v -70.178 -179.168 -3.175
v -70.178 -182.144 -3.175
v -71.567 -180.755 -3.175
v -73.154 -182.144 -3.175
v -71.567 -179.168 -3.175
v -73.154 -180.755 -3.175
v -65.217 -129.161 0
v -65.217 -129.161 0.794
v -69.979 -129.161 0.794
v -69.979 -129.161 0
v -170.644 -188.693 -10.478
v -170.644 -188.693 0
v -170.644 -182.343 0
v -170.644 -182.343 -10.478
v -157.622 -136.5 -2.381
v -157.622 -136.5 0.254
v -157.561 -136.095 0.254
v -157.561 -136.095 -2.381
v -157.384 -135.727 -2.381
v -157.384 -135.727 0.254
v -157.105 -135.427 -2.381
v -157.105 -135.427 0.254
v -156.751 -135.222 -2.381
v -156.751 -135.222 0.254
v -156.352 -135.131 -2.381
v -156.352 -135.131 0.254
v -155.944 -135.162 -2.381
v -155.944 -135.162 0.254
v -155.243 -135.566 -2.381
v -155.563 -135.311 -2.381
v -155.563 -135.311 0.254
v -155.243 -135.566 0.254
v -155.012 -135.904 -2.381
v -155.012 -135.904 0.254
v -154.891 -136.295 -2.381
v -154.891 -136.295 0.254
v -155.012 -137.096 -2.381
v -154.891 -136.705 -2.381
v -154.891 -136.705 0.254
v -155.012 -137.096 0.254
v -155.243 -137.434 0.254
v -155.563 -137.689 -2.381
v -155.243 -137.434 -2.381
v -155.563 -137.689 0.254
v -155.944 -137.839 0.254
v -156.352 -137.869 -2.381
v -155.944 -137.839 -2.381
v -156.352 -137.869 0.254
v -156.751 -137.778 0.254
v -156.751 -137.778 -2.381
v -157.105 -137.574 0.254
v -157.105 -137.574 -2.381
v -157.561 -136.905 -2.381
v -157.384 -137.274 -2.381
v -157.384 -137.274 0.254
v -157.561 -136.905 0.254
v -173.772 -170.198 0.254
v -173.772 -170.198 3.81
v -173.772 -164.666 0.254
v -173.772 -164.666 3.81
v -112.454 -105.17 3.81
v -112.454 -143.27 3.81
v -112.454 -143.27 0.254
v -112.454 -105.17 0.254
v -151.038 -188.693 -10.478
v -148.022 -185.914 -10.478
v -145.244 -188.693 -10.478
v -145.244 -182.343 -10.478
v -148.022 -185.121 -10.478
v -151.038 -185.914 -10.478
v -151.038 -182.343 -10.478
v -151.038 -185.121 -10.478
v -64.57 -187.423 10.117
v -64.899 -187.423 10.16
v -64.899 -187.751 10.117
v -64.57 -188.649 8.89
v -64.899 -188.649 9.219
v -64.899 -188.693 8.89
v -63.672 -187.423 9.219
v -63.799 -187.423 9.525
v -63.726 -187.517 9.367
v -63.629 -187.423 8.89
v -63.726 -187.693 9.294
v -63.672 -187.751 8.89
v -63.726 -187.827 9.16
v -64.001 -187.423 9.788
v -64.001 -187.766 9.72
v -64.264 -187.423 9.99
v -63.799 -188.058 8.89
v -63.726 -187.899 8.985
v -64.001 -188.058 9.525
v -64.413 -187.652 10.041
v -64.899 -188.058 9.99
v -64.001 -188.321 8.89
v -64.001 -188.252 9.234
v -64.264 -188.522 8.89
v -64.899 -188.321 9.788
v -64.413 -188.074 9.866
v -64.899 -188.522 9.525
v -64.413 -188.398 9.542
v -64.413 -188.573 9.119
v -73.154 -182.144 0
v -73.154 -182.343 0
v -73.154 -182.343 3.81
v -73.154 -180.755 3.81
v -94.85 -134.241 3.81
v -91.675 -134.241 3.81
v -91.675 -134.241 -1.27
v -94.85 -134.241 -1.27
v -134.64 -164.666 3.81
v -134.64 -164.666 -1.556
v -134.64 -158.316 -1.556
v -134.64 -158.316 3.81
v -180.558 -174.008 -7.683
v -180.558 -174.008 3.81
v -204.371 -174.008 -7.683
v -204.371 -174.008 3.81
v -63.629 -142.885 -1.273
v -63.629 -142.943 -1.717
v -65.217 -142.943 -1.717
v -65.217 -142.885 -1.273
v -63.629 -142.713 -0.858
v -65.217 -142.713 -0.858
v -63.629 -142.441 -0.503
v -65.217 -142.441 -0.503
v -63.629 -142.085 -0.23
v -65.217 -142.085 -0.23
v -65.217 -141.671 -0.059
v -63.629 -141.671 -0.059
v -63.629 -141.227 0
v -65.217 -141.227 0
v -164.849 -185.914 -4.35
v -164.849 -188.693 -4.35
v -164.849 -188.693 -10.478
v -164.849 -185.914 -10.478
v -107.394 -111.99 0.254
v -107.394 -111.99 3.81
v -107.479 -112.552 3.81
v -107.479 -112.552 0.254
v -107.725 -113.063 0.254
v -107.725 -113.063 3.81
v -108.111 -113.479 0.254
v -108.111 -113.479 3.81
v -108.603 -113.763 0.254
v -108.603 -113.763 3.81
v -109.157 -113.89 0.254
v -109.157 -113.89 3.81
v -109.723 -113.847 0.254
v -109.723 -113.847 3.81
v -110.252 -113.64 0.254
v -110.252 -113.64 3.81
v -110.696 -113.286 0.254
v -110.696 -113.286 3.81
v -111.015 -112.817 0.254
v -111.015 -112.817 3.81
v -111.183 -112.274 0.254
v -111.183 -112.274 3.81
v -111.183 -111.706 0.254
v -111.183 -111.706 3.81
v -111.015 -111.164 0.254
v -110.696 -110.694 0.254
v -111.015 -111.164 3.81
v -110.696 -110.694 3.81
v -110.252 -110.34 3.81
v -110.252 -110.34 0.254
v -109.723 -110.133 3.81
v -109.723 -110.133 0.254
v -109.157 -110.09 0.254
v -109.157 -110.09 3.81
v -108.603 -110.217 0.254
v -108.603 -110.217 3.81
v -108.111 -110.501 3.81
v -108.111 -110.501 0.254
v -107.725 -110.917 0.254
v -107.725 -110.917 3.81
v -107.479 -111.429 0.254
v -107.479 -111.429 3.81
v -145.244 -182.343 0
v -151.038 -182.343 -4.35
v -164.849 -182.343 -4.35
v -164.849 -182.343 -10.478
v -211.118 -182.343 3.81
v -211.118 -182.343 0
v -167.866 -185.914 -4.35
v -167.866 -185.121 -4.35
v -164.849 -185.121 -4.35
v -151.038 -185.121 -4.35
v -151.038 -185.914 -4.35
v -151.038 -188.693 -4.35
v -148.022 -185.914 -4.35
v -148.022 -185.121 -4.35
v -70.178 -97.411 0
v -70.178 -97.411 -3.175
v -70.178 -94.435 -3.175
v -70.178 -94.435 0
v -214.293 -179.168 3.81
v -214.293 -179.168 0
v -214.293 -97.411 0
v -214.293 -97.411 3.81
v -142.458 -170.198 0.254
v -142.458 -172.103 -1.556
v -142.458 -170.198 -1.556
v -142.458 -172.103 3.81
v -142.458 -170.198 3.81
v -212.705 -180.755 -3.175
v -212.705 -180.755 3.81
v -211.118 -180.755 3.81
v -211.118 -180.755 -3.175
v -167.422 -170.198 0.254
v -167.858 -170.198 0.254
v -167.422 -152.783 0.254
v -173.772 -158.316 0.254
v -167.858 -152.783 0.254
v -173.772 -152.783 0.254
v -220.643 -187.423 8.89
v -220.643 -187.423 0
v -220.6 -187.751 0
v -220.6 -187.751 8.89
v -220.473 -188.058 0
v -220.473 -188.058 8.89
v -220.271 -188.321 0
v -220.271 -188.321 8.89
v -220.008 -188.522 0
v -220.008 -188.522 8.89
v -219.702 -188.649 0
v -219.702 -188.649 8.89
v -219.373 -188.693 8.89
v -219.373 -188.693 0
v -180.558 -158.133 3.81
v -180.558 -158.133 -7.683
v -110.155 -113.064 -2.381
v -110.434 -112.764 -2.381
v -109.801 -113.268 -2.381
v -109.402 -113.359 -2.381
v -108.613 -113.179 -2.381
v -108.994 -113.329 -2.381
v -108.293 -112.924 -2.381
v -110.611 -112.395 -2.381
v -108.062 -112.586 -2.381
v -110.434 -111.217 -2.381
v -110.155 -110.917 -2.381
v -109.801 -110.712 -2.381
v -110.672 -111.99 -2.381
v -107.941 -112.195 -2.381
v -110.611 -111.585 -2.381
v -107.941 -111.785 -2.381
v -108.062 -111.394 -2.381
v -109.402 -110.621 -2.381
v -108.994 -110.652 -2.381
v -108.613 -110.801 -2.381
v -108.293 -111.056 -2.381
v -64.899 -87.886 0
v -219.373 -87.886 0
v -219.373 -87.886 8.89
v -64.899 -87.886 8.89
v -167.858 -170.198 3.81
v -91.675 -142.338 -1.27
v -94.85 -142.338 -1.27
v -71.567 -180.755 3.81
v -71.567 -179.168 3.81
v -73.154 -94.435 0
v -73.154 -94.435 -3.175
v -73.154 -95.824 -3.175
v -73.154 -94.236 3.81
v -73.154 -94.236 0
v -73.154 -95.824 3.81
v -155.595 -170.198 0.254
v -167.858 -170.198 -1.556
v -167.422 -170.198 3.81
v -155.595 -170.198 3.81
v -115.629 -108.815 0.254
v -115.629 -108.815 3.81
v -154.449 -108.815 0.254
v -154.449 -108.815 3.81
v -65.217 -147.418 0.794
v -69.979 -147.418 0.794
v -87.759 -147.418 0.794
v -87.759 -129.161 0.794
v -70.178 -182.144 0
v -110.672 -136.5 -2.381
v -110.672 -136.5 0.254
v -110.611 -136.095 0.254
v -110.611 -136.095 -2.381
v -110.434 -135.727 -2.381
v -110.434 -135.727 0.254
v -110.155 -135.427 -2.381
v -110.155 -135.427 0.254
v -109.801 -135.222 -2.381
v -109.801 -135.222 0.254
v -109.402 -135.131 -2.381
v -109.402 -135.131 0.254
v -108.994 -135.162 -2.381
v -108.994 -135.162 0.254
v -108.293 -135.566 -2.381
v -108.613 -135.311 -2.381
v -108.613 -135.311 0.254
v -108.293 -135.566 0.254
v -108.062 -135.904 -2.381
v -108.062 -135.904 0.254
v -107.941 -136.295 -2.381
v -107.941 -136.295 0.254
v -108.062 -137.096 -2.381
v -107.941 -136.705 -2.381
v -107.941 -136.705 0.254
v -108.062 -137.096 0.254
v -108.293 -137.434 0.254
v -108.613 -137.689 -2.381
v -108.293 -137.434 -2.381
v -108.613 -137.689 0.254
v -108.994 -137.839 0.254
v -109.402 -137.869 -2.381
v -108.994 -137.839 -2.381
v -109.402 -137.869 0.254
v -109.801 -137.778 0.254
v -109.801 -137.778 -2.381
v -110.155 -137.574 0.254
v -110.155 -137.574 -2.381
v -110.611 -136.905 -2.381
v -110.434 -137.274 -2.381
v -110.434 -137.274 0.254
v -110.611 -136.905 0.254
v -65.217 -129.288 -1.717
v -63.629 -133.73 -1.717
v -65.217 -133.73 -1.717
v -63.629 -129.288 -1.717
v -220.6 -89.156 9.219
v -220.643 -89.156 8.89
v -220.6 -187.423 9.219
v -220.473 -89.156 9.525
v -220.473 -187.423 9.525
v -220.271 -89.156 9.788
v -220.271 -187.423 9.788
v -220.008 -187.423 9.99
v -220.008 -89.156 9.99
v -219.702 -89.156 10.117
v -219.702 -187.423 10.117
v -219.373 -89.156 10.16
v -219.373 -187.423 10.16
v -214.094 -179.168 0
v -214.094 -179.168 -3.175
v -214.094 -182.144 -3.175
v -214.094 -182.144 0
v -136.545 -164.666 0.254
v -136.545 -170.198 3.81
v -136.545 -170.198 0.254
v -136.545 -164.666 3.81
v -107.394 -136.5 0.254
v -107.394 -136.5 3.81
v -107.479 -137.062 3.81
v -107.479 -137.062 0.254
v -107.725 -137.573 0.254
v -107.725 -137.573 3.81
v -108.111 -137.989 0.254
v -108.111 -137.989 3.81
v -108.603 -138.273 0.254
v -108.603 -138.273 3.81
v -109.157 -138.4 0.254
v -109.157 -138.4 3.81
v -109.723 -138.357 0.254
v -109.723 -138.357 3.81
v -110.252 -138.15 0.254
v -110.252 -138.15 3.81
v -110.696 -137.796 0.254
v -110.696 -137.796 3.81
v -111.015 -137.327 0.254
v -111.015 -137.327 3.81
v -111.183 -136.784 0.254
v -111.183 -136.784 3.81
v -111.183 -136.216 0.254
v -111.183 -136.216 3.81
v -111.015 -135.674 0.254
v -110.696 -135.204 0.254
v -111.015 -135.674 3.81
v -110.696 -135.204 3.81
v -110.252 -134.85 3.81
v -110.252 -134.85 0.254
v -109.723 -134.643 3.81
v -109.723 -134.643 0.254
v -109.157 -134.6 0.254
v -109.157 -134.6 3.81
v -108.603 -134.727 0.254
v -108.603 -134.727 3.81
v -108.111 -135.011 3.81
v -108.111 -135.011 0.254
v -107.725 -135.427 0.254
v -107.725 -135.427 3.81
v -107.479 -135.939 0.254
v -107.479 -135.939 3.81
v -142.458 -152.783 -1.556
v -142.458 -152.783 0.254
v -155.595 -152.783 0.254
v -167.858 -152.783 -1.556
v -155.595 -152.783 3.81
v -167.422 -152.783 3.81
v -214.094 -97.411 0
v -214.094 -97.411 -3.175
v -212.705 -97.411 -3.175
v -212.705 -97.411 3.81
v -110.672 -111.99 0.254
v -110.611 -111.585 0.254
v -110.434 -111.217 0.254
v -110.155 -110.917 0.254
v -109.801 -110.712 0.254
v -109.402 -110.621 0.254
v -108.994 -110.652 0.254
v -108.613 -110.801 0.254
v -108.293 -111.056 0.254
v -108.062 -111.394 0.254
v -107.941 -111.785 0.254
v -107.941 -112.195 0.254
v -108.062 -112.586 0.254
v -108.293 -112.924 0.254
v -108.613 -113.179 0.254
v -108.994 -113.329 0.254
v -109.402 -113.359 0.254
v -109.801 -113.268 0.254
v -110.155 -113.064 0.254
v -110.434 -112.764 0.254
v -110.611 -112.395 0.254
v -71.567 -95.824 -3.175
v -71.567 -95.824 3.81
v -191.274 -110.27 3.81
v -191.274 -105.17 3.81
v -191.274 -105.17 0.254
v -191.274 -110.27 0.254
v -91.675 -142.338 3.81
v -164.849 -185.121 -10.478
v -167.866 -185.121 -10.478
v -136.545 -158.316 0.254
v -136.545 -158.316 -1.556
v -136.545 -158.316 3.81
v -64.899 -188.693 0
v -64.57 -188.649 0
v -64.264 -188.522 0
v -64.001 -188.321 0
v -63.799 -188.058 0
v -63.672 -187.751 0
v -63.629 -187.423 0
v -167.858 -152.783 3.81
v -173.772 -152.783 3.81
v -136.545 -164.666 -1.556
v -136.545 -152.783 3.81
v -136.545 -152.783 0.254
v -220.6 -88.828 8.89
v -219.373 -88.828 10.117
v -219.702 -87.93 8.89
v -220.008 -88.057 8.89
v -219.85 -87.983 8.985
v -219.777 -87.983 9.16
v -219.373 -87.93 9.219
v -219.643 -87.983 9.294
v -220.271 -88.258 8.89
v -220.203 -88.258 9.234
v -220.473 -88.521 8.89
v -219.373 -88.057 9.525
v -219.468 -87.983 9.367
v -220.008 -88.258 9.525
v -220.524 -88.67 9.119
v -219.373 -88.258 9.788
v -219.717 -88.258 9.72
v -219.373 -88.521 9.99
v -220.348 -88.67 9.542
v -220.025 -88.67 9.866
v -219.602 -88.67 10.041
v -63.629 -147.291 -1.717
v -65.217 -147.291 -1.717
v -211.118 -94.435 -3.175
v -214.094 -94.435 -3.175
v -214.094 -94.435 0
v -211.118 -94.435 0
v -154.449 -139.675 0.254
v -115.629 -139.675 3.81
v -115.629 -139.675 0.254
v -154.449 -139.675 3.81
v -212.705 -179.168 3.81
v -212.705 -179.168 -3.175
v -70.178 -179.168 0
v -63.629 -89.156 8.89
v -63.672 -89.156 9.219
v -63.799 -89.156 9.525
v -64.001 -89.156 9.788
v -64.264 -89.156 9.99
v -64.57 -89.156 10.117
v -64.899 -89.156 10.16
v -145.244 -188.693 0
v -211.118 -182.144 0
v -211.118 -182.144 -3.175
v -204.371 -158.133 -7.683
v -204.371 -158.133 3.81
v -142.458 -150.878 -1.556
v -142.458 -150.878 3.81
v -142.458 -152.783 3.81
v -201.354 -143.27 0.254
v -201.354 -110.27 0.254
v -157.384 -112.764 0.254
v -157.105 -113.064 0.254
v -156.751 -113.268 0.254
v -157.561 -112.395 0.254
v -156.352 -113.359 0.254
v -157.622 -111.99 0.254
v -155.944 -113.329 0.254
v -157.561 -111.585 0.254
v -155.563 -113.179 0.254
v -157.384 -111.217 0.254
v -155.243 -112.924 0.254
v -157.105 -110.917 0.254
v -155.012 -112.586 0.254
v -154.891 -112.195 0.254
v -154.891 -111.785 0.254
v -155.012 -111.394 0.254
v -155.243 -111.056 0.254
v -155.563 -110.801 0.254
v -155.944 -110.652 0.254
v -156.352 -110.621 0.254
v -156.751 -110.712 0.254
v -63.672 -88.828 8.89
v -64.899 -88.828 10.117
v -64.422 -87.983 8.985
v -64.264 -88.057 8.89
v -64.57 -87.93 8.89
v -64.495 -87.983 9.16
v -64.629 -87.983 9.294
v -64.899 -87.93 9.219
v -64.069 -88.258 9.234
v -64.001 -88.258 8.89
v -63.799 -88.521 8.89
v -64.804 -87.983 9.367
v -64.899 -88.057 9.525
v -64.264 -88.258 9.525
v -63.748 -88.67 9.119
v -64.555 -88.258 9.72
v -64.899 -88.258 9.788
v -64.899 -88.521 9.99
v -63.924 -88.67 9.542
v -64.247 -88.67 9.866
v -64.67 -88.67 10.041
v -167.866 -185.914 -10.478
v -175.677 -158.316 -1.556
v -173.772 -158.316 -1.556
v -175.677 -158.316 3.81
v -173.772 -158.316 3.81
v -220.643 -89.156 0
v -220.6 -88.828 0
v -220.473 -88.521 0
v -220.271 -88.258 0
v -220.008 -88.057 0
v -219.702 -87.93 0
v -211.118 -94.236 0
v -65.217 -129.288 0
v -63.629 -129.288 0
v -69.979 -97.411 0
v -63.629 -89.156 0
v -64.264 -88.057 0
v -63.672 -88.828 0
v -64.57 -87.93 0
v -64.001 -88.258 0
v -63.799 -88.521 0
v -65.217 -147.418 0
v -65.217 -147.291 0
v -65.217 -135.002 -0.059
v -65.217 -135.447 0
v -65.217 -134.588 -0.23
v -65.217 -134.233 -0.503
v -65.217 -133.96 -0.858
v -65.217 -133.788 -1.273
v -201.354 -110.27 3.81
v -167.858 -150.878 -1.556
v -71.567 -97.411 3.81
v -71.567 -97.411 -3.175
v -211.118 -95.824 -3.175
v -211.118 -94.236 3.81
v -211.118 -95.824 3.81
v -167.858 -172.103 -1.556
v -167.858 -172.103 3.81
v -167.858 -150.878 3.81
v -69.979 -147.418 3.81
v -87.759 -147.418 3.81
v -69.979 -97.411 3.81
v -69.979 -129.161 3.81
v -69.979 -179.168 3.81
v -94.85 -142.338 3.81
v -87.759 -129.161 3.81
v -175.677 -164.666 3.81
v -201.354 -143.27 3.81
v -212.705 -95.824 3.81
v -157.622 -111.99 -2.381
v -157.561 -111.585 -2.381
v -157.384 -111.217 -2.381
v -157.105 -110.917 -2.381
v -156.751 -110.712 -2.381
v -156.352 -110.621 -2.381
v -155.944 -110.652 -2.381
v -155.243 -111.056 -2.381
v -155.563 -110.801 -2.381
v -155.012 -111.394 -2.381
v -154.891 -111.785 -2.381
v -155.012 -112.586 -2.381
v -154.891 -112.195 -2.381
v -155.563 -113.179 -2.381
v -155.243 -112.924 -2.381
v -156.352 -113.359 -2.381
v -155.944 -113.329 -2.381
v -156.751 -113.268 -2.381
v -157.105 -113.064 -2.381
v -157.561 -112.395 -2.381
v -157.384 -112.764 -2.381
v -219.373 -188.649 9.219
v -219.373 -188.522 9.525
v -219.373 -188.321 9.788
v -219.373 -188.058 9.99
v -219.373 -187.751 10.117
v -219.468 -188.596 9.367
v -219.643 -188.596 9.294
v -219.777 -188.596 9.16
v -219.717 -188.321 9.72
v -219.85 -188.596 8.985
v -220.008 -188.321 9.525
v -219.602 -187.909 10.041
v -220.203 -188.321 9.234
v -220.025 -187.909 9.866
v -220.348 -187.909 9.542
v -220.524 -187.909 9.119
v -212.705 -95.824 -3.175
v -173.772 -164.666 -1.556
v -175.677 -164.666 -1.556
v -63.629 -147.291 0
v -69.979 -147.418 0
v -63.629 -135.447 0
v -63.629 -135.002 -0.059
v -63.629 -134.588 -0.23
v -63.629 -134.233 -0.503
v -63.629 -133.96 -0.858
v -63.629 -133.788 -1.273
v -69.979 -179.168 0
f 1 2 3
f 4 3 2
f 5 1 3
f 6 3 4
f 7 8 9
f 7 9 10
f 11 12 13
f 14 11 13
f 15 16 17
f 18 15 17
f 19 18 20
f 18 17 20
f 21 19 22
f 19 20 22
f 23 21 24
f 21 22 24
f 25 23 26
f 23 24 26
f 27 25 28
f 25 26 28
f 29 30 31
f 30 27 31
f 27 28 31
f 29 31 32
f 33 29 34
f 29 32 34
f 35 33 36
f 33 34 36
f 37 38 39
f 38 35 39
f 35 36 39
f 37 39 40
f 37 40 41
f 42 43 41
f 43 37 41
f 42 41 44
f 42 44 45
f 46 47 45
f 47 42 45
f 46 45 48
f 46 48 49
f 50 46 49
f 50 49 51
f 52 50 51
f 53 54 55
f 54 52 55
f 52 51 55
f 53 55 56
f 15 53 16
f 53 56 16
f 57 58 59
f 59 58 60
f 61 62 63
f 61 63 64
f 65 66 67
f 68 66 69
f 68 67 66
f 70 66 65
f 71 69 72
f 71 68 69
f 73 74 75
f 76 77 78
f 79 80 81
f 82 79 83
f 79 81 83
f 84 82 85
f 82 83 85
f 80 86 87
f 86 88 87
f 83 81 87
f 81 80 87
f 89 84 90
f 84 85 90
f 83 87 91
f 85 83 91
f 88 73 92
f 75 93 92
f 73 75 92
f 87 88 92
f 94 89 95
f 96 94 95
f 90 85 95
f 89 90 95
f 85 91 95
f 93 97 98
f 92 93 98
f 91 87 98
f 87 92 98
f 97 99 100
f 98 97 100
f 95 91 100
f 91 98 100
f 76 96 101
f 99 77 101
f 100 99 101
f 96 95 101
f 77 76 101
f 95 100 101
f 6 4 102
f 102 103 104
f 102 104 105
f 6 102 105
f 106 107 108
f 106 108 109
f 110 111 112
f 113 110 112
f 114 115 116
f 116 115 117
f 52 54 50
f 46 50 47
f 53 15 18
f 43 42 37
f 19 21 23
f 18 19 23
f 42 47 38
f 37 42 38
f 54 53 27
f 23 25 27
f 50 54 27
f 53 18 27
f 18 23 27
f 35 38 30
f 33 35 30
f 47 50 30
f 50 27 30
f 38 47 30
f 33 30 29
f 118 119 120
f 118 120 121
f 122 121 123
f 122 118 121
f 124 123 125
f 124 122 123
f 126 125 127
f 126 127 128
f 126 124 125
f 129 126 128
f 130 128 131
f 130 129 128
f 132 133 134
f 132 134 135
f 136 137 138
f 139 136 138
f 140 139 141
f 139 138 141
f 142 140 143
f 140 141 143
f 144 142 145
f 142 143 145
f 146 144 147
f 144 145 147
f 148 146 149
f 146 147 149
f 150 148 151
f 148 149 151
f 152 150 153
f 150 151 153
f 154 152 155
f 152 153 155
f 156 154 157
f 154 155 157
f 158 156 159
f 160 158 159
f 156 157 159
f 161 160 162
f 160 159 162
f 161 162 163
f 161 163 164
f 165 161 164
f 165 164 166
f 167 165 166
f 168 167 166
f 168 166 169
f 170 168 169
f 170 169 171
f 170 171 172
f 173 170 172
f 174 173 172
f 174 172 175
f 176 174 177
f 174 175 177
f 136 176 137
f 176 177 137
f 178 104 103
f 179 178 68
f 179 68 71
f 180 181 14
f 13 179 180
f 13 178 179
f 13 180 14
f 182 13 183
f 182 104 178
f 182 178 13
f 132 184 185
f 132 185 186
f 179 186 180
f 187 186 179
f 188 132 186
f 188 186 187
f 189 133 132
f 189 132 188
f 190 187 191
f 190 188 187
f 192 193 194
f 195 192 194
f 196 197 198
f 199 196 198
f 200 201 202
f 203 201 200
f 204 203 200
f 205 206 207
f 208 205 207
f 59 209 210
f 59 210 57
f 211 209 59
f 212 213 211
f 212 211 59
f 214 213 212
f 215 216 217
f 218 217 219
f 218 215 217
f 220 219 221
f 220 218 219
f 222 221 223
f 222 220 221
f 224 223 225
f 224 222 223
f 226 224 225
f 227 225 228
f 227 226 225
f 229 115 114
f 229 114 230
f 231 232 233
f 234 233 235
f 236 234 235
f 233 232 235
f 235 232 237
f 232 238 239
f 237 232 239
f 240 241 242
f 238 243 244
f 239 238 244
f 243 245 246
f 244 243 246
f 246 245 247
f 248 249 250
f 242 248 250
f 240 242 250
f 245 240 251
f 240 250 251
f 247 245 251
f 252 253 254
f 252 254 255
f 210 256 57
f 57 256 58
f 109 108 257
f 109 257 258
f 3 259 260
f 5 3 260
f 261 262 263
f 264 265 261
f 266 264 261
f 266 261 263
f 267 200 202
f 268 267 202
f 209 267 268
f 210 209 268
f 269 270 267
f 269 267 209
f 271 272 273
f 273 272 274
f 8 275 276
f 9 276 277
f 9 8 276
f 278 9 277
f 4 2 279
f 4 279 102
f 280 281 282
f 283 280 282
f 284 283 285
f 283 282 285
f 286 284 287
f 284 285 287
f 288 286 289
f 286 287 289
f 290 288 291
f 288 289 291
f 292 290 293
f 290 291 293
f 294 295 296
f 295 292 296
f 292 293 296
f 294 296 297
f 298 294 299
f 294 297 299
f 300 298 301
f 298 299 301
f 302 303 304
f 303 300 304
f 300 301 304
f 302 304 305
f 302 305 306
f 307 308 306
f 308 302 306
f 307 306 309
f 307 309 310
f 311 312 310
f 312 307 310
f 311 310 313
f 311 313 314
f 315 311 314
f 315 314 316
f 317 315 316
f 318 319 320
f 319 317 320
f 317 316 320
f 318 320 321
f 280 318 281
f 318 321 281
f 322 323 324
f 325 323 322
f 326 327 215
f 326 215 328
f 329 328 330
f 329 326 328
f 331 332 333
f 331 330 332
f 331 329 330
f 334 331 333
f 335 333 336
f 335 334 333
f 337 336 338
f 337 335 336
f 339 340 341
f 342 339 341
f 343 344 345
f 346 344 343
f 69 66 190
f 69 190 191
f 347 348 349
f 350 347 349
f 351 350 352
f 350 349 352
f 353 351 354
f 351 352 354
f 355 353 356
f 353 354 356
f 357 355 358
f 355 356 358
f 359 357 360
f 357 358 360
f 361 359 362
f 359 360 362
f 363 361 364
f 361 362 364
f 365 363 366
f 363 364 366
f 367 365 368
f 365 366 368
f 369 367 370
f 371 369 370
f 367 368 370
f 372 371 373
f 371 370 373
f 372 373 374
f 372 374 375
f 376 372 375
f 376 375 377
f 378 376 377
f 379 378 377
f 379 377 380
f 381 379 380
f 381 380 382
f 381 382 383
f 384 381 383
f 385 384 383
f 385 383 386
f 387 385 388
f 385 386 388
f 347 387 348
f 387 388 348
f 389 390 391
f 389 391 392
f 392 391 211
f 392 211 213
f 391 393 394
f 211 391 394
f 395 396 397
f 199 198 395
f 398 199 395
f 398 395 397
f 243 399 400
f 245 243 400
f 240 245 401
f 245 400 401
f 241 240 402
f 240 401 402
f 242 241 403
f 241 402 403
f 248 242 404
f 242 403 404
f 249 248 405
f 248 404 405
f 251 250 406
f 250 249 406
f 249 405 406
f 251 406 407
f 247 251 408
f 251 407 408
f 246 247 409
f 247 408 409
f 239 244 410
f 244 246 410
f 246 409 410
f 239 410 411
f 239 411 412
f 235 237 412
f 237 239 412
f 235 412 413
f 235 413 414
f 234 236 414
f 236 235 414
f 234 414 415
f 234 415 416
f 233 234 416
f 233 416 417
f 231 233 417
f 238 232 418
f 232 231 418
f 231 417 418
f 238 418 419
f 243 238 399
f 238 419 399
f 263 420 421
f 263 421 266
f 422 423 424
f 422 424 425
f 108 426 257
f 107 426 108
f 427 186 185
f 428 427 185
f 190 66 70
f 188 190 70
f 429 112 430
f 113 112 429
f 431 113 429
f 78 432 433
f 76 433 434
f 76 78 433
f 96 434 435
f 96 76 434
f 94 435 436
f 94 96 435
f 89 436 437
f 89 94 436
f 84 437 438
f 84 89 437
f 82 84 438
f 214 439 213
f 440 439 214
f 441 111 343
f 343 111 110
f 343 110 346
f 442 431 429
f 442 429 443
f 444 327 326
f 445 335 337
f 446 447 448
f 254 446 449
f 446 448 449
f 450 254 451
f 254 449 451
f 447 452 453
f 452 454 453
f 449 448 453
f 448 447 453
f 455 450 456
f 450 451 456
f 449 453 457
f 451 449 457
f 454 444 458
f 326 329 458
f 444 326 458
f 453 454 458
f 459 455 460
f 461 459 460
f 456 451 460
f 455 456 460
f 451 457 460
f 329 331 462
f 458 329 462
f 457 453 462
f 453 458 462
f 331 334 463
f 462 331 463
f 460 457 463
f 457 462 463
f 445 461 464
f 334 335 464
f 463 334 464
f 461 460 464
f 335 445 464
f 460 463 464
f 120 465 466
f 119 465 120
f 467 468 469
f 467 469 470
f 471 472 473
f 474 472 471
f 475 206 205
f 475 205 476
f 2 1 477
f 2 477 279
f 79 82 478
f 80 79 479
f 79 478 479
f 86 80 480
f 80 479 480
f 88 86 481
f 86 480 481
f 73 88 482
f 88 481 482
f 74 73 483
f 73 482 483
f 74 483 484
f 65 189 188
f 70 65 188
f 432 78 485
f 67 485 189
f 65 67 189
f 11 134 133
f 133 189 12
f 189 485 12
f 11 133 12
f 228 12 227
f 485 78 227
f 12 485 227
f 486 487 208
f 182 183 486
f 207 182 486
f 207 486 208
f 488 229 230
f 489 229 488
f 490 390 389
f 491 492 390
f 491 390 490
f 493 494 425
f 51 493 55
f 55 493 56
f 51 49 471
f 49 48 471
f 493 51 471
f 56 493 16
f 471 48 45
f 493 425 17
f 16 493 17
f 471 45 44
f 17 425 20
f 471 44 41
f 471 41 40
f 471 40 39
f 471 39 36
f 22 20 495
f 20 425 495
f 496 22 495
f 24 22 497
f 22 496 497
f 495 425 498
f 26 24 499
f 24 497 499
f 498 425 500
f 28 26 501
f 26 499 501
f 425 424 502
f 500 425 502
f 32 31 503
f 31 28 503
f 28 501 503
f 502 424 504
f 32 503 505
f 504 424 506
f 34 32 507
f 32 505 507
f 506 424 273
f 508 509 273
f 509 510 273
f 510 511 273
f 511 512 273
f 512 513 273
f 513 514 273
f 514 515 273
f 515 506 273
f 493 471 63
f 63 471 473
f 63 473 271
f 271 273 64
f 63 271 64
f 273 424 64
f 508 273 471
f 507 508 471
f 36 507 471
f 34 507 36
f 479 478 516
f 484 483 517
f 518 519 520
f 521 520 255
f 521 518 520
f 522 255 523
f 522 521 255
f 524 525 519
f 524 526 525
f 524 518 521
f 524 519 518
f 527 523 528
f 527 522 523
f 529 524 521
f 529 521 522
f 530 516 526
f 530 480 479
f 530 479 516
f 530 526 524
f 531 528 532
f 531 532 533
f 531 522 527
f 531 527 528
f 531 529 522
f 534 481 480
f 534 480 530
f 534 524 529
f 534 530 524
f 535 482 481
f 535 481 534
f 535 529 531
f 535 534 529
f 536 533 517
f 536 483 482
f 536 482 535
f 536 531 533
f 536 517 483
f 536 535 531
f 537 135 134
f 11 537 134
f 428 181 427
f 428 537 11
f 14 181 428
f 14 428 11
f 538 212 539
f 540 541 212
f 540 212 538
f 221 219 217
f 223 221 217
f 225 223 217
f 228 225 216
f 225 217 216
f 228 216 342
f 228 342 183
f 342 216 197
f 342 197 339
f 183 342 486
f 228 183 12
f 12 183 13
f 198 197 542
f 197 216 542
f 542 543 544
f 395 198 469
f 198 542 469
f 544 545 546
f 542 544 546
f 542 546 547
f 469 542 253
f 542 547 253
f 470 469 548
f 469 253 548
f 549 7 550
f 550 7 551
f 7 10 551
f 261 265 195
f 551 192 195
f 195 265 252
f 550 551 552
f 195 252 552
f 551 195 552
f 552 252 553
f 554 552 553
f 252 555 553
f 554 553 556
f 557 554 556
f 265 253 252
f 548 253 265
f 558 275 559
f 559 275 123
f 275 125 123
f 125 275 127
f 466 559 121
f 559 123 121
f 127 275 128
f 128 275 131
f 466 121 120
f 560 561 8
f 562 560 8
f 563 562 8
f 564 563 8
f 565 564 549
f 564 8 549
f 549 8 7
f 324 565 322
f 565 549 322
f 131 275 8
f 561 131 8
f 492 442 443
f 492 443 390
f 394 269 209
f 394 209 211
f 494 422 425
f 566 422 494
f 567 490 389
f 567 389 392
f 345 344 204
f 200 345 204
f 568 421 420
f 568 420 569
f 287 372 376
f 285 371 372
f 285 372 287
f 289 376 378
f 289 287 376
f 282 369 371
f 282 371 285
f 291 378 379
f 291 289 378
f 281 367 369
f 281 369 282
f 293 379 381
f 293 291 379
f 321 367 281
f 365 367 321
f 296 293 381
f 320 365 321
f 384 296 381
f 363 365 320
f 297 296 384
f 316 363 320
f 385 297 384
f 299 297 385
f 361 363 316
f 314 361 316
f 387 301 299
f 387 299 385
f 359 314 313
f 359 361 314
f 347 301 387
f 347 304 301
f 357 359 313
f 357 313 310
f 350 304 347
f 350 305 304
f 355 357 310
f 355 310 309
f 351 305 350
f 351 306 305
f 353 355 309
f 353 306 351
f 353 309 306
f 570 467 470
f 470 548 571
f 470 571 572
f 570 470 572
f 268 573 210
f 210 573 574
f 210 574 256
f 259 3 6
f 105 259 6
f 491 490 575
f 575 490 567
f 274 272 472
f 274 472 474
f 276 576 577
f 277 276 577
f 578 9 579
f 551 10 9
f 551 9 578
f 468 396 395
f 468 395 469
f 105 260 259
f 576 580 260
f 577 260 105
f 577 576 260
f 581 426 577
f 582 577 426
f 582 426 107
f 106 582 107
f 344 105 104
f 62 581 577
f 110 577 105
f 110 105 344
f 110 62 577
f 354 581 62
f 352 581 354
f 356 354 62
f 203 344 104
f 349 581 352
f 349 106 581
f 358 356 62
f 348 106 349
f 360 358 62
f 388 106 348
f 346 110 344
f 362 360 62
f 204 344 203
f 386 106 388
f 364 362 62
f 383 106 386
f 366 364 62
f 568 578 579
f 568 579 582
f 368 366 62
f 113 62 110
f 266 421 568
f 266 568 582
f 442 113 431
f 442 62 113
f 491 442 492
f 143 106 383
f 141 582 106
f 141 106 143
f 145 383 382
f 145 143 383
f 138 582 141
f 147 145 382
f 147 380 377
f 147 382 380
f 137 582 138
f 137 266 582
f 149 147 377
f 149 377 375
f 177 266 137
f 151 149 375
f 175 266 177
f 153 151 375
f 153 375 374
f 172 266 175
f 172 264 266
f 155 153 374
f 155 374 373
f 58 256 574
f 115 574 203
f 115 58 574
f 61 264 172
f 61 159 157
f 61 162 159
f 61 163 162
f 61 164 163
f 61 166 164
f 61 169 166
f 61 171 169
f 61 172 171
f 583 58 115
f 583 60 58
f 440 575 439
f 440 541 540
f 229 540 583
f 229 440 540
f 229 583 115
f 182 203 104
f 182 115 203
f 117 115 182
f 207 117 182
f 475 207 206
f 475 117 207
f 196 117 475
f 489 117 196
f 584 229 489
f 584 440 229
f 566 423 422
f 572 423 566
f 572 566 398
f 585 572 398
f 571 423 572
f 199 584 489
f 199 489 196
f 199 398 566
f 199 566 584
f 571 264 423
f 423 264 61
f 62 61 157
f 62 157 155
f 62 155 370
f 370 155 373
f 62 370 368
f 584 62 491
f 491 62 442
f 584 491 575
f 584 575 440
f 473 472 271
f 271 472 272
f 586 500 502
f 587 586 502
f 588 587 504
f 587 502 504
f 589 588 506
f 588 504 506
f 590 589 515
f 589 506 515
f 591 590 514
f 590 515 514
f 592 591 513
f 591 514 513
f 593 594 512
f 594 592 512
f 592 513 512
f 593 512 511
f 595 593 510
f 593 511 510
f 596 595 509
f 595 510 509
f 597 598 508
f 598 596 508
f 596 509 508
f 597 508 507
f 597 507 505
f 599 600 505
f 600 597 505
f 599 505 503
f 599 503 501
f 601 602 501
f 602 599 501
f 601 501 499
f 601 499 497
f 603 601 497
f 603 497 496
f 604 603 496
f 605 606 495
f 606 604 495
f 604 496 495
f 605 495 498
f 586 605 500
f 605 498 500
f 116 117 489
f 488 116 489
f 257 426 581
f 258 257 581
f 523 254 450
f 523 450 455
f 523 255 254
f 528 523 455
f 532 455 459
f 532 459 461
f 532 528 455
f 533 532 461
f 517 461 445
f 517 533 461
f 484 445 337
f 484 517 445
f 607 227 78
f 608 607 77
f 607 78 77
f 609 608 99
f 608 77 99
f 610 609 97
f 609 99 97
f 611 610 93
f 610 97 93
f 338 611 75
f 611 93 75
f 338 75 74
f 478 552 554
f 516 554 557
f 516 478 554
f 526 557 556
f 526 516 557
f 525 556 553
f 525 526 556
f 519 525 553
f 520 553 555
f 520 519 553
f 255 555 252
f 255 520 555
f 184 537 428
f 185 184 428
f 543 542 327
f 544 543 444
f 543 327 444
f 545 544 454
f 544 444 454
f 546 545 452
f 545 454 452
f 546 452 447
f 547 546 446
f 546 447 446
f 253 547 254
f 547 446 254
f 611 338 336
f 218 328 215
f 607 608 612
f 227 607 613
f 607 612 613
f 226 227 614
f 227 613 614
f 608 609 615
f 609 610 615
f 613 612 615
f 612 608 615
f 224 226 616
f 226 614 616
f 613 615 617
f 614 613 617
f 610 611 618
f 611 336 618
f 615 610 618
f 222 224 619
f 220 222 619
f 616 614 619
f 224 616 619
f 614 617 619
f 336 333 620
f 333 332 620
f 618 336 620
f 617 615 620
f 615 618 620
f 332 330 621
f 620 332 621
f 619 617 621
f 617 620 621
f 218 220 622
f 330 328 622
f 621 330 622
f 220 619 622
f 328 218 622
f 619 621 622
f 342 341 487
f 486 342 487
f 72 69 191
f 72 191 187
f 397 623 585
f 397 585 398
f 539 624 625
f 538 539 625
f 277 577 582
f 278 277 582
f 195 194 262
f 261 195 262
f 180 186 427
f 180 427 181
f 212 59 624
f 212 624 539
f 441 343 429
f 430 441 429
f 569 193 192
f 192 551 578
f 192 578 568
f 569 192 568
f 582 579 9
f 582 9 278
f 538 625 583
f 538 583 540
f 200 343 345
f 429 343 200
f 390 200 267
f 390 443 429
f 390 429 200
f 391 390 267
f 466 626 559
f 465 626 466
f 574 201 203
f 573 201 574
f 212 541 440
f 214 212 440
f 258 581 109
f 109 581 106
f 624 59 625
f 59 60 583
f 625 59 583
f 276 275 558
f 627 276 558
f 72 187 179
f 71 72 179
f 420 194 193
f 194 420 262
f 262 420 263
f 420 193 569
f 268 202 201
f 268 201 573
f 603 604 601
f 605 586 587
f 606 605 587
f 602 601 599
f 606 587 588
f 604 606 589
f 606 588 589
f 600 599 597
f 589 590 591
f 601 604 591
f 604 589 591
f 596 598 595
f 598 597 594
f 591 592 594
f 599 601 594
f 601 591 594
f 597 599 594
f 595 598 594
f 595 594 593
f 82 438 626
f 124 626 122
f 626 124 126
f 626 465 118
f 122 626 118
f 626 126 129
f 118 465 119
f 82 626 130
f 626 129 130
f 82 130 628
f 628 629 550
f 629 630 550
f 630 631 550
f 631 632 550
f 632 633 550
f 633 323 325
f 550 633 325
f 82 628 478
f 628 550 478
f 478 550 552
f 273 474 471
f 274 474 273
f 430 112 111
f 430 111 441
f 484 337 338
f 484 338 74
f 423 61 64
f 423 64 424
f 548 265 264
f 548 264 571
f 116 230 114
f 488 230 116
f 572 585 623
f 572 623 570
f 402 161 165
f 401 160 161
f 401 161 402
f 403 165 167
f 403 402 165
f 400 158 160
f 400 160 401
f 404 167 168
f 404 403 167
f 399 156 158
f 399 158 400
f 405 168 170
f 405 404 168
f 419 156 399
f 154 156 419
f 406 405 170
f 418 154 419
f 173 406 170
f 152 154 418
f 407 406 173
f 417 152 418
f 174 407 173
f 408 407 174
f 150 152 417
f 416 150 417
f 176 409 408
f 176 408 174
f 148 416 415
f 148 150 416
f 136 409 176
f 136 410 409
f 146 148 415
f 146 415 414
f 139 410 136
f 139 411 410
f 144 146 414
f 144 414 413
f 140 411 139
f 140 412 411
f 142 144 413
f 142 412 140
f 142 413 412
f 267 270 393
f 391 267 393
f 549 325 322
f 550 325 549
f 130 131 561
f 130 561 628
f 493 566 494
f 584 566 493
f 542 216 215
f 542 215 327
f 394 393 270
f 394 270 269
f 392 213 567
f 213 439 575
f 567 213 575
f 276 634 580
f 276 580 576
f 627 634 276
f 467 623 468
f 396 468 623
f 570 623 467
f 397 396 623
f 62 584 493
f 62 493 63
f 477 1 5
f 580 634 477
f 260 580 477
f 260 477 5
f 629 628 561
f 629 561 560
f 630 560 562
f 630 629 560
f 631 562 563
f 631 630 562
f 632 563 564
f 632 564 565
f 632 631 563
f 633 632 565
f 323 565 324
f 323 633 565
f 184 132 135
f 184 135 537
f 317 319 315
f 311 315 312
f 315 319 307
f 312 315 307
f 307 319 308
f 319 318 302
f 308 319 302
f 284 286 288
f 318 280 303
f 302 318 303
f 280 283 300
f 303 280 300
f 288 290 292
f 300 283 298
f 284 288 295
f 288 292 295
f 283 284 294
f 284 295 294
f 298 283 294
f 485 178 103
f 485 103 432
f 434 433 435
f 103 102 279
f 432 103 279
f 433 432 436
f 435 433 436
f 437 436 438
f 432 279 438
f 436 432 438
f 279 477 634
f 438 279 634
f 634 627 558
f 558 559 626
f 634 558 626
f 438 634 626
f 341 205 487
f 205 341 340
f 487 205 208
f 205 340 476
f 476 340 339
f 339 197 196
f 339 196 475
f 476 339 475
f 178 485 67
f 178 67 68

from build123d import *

# Parameters (mm, degrees)
SKETCH1_W                                = 157.01375
SKETCH1_H                                = 100.80625
BOSS_EXTRUDE1_DEPTH                      = 10.16
SKETCH2_W                                = 144.31375
SKETCH2_H                                = 88.10625
CUT_EXTRUDE1_DEPTH                       = 3.81
SKETCH3_R                                = 1.373000048
BOSS_EXTRUDE2_DEPTH                      = 13.208
SKETCH4_R                                = 1.905
SKETCH4_W                                = 38.820000042
SKETCH4_H                                = 30.86
BOSS_EXTRUDE3_DEPTH                      = 3.556
SKETCH5_W                                = 140.45073311
SKETCH5_H                                = 20.997286457
CUT_EXTRUDE2_DEPTH                       = 61.722
SKETCH6_W                                = 3.175
SKETCH6_H                                = 3.175
BOSS_EXTRUDE4_DEPTH                      = 6.985
SKETCH7_W                                = 1.5875
SKETCH7_H                                = 1.5875
CUT_EXTRUDE3_DEPTH                       = 6.985
MIRROR2_COPY_1_SKETCH_W                  = 3.175
MIRROR2_COPY_1_SKETCH_H                  = 3.175
MIRROR2_COPY_1_DEPTH                     = 6.985
MIRROR2_COPY_2_SKETCH_W                  = 1.5875
MIRROR2_COPY_2_SKETCH_H                  = 1.5875
MIRROR2_COPY_2_DEPTH                     = 6.985
CUT_EXTRUDE4_DEPTH                       = 3.175
MIRROR3_AT_THE_SECOND_PLANE_COPY_1_DEPTH = 3.175
FILLET1_R                                = 1.27
SKETCH9_W                                = 23.8125
SKETCH9_H                                = 15.875
BOSS_EXTRUDE5_DEPTH                      = 11.4935
CUT_EXTRUDE5_START                       = -1.5875
SKETCH10_W                               = 9.261227228
SKETCH10_H                               = 18.25625
CUT_EXTRUDE5_DEPTH                       = 13.97
SKETCH12_W                               = 17.78
SKETCH12_H                               = 18.25625
BOSS_EXTRUDE6_DEPTH                      = 3.01625
SKETCH13_W                               = 3.175
SKETCH13_H                               = 8.09625
BOSS_EXTRUDE7_DEPTH                      = 5.08
BOSS_EXTRUDE9_DEPTH                      = 1.5875
SKETCH17_W                               = 25.4
SKETCH17_H                               = 3.81
SKETCH17_W_2                             = 3.81
SKETCH17_H_2                             = 6.35
BOSS_EXTRUDE10_DEPTH                     = 5.36575
SKETCH18_W                               = 19.05
SKETCH18_H                               = 17.414875
SKETCH18_W_2                             = 6.35
BOSS_EXTRUDE11_DEPTH                     = 3.556
SKETCH19_W                               = 13.81125
SKETCH19_H                               = 4.34975
BOSS_EXTRUDE12_DEPTH                     = 6.35
SKETCH21_W                               = 5.794375
SKETCH21_H                               = 6.35
BOSS_EXTRUDE13_DEPTH                     = 10.4775
SKETCH22_W                               = 19.84375
SKETCH22_H                               = 0.79375
CUT_EXTRUDE6_DEPTH                       = 6.12775
SKETCH23_W                               = 1.905
SKETCH23_H                               = 6.35
SKETCH23_W_2                             = 25.4
SKETCH23_H_2                             = 1.905
CUT_EXTRUDE7_DEPTH                       = 5.36575


with BuildPart() as part:
    # Sketch1 → Boss-Extrude1 (new body)
    with BuildSketch(Plane.XY):
        with Locations((-142.135983, -138.289483)):
            Rectangle(SKETCH1_W, SKETCH1_H)
    extrude(amount=BOSS_EXTRUDE1_DEPTH)

    # Sketch2 → Cut-Extrude1 (cut)
    with BuildSketch(Plane(origin=(0, 0, 0), x_dir=(-1, 0, 0), z_dir=(0, 0, -1))):
        with Locations((142.135983, -138.289483)):
            Rectangle(SKETCH2_W, SKETCH2_H)
    extrude(amount=-CUT_EXTRUDE1_DEPTH, mode=Mode.SUBTRACT)

    # Sketch3 → Boss-Extrude2 (add)
    with BuildSketch(Plane(origin=(0, 0, 3.81), x_dir=(-1, 0, 0), z_dir=(0, 0, -1))):
        with Locations((109.299108, -111.990108)):
            Circle(SKETCH3_R)
        with Locations((156.249108, -111.990108)):
            Circle(SKETCH3_R)
        with Locations((156.249108, -136.500108)):
            Circle(SKETCH3_R)
        with Locations((109.299108, -136.500108)):
            Circle(SKETCH3_R)
    extrude(amount=BOSS_EXTRUDE2_DEPTH)

    # Sketch4 → Boss-Extrude3 (add)
    # profile 1 of 3: a face of its own
    with BuildSketch(Plane(origin=(0, 0, 3.81), x_dir=(-1, 0, 0), z_dir=(0, 0, -1))):
        with Locations(Location((109.299108, -111.990108, 0), (0, 0, 180))):
            Circle(SKETCH4_R)
    # profile 2 of 3: a face of its own
    with BuildSketch(Plane(origin=(0, 0, 3.81), x_dir=(-1, 0, 0), z_dir=(0, 0, -1))):
        with Locations(Location((109.299108, -136.500108, 0), (0, 0, 180))):
            Circle(SKETCH4_R)
    # profile 3 of 3: a face of its own
    with BuildSketch(Plane(origin=(0, 0, 3.81), x_dir=(-1, 0, 0), z_dir=(0, 0, -1))):
        Polygon((112.454108, -105.170108), (191.274108, -105.170108), (191.274108, -110.270108), (201.354108, -110.270108), (201.354108, -143.270108), (112.454108, -143.270108), align=None)
        with Locations((135.039108021, -124.245108)):
            Rectangle(SKETCH4_W, SKETCH4_H, mode=Mode.SUBTRACT)
    extrude(amount=BOSS_EXTRUDE3_DEPTH)

    # Sketch5 → Cut-Extrude2 (cut)
    with BuildSketch(Plane(origin=(0, -87.886358, 0), x_dir=(1, 0, 0), z_dir=(0, 1, 0))):
        with Locations((-140.972363451, 12.879893229)):
            Rectangle(SKETCH5_W, SKETCH5_H)
    extrude(amount=-CUT_EXTRUDE2_DEPTH, mode=Mode.SUBTRACT)

    # Sketch6 → Boss-Extrude4 (add)
    with BuildSketch(Plane(origin=(0, 0, 3.81), x_dir=(-1, 0, 0), z_dir=(0, 0, -1))):
        with Locations((71.566608, -180.755108)):
            Rectangle(SKETCH6_W, SKETCH6_H)
    boss_extrude4 = extrude(amount=BOSS_EXTRUDE4_DEPTH)

    # Sketch7 → Cut-Extrude3 (cut)
    with BuildSketch(Plane(origin=(0, 0, -3.175), x_dir=(-1, 0, 0), z_dir=(0, 0, -1))):
        with Locations((72.360358, -179.961358)):
            Rectangle(SKETCH7_W, SKETCH7_H)
    cut_extrude3 = extrude(amount=-CUT_EXTRUDE3_DEPTH, mode=Mode.SUBTRACT)

    # Mirror1: Boss-Extrude4, Cut-Extrude3 across plane
    add(boss_extrude4.mirror(Plane(origin=(0, -138.289483, 0), x_dir=(0, 0, 1), z_dir=(0, -1, 0))))
    add(cut_extrude3.mirror(Plane(origin=(0, -138.289483, 0), x_dir=(0, 0, 1), z_dir=(0, -1, 0))), mode=Mode.SUBTRACT)

    # Mirror2: Boss-Extrude4, Cut-Extrude3 across plane
    add(boss_extrude4.mirror(Plane(origin=(-142.135983, 0, 0), x_dir=(0, 0, 1), z_dir=(1, 0, 0))))
    add(cut_extrude3.mirror(Plane(origin=(-142.135983, 0, 0), x_dir=(0, 0, 1), z_dir=(1, 0, 0))), mode=Mode.SUBTRACT)

    # Mirror2 copy 1 sketch → Mirror2 copy 1 (add)
    with BuildSketch(Plane(origin=(-284.271966, -276.578966, 3.81), x_dir=(1, 0, 0), z_dir=(0, 0, -1))):
        with Locations((71.566608, -180.755108)):
            Rectangle(MIRROR2_COPY_1_SKETCH_W, MIRROR2_COPY_1_SKETCH_H)
    extrude(amount=MIRROR2_COPY_1_DEPTH)

    # Mirror2 copy 2 sketch → Mirror2 copy 2 (cut)
    with BuildSketch(Plane(origin=(-284.271966, -276.578966, -3.175), x_dir=(1, 0, 0), z_dir=(0, 0, -1))):
        with Locations((72.360358, -179.961358)):
            Rectangle(MIRROR2_COPY_2_SKETCH_W, MIRROR2_COPY_2_SKETCH_H)
    extrude(amount=-MIRROR2_COPY_2_DEPTH, mode=Mode.SUBTRACT)

    # Sketch8 → Cut-Extrude4 (cut)
    with BuildSketch(Plane(origin=(0, 0, -3.175), x_dir=(-1, 0, 0), z_dir=(0, 0, -1))):
        Polygon((69.979108, -179.167608), (70.1775455, -179.167608), (70.1775455, -182.1441705), (73.154108, -182.1441705), (73.154108, -182.342608), (69.979108, -182.342608), align=None)
    cut_extrude4 = extrude(amount=-CUT_EXTRUDE4_DEPTH, mode=Mode.SUBTRACT)

    # Mirror3: Cut-Extrude4 across plane
    add(cut_extrude4.mirror(Plane(origin=(-142.135983, 0, 0), x_dir=(0, 0, 1), z_dir=(1, 0, 0))), mode=Mode.SUBTRACT)

    # Mirror3 at the second plane: Cut-Extrude4 across plane
    add(cut_extrude4.mirror(Plane(origin=(0, -138.289483, 0), x_dir=(0, 0, 1), z_dir=(0, -1, 0))), mode=Mode.SUBTRACT)

    # Mirror3 at the second plane copy 1 sketc → Mirror3 at the second plane copy 1 (cut)
    with BuildSketch(Plane(origin=(-284.271966, -276.578966, -3.175), x_dir=(1, 0, 0), z_dir=(0, 0, -1))):
        Polygon((69.979108, -179.167608), (70.1775455, -179.167608), (70.1775455, -182.1441705), (73.154108, -182.1441705), (73.154108, -182.342608), (69.979108, -182.342608), align=None)
    extrude(amount=-MIRROR3_AT_THE_SECOND_PLANE_COPY_1_DEPTH, mode=Mode.SUBTRACT)

    # Fillet1
    fillet1_edges = [part.edges().sort_by_distance(p)[0] for p in [
        (-220.642858, -138.289483, 10.16),
        (-142.135983, -188.692608, 10.16),
        (-63.629108, -138.289483, 10.16),
        (-63.629108, -188.692608, 5.08),
        (-220.642858, -188.692608, 5.08),
        (-220.642858, -87.886358, 5.08),
        (-63.629108, -87.886358, 5.08),
        (-142.135983, -87.886358, 10.16),
    ]]
    fillet(fillet1_edges, radius=FILLET1_R)

    # Sketch9 → Boss-Extrude5 (add)
    with BuildSketch(Plane(origin=(0, 0, 3.81), x_dir=(-1, 0, 0), z_dir=(0, 0, -1))):
        with Locations((192.464733, -166.070733)):
            Rectangle(SKETCH9_W, SKETCH9_H)
    extrude(amount=BOSS_EXTRUDE5_DEPTH)

    # Sketch10 → Cut-Extrude5 (cut)
    with BuildSketch(Plane(origin=(-63.629108, 0, 0), x_dir=(0, 0, -1), z_dir=(1, 0, 0)).offset(CUT_EXTRUDE5_START)):
        with Locations((3.836863614, -138.289483)):
            Rectangle(SKETCH10_W, SKETCH10_H)
    extrude(amount=-CUT_EXTRUDE5_DEPTH, mode=Mode.SUBTRACT)

    # Sketch12 → Boss-Extrude6 (add)
    with BuildSketch(Plane(origin=(0, 0, 3.81), x_dir=(-1, 0, 0), z_dir=(0, 0, -1))):
        with Locations((78.869108, -138.289483)):
            Rectangle(SKETCH12_W, SKETCH12_H)
    extrude(amount=BOSS_EXTRUDE6_DEPTH)

    # Sketch13 → Boss-Extrude7 (add)
    with BuildSketch(Plane(origin=(0, 0, 3.81), x_dir=(-1, 0, 0), z_dir=(0, 0, -1))):
        with Locations((93.262857978, -138.289483)):
            Rectangle(SKETCH13_W, SKETCH13_H)
    extrude(amount=BOSS_EXTRUDE7_DEPTH)

    # Sketch14 → Boss-Extrude9 (add)
    with BuildSketch(Plane(origin=(-63.629108, 0, 0), x_dir=(0, 0, -1), z_dir=(1, 0, 0))):
        with BuildLine():
            Line((0, -129.288357934), (0, -135.446608))
            ThreePointArc((0, -135.446608), (0.502861016, -134.232594116), (1.7168749, -133.7297331))
            Line((1.7168749, -133.7297331), (1.7168749, -129.288357934))
            Line((1.7168749, -129.288357934), (0, -129.288357934))
        make_face()
        with BuildLine():
            Line((0, -147.290608064), (1.7168749, -147.290608064))
            Line((1.7168749, -147.290608064), (1.7168749, -142.9434829))
            ThreePointArc((1.7168749, -142.9434829), (0.502861016, -142.440621884), (0, -141.226608))
            Line((0, -141.226608), (0, -147.290608064))
        make_face()
    extrude(amount=-BOSS_EXTRUDE9_DEPTH)

    # Sketch17 → Boss-Extrude10 (add)
    with BuildSketch(Plane(origin=(0, 0, 3.81), x_dir=(-1, 0, 0), z_dir=(0, 0, -1))):
        with Locations((155.158483, -172.103233)):
            Rectangle(SKETCH17_W, SKETCH17_H)
        with Locations((155.158483, -150.878358)):
            Rectangle(SKETCH17_W, SKETCH17_H)
        with Locations((175.6769205, -161.4907955)):
            Rectangle(SKETCH17_W_2, SKETCH17_H_2)
        with Locations((134.6400455, -161.4907955)):
            Rectangle(SKETCH17_W_2, SKETCH17_H_2)
    extrude(amount=BOSS_EXTRUDE10_DEPTH)

    # Sketch18 → Boss-Extrude11 (add)
    with BuildSketch(Plane(origin=(0, 0, 3.81), x_dir=(-1, 0, 0), z_dir=(0, 0, -1))):
        with Locations((146.0700455, -161.4907955)):
            Rectangle(SKETCH18_W, SKETCH18_H)
        with Locations((170.5969205, -161.4907955)):
            Rectangle(SKETCH18_W_2, SKETCH18_H)
    extrude(amount=BOSS_EXTRUDE11_DEPTH)

    # Sketch19 → Boss-Extrude12 (add)
    with BuildSketch(Plane.XZ.offset(188.692608)):
        with Locations((-157.943647906, -2.174875)):
            Rectangle(SKETCH19_W, SKETCH19_H)
    extrude(amount=-BOSS_EXTRUDE12_DEPTH)

    # Sketch21 → Boss-Extrude13 (add)
    with BuildSketch(Plane(origin=(0, 0, 0), x_dir=(-1, 0, 0), z_dir=(0, 0, -1))):
        with Locations((148.140835406, -185.517608)):
            Rectangle(SKETCH21_W, SKETCH21_H)
        with Locations((167.746460406, -185.517608)):
            Rectangle(SKETCH21_W, SKETCH21_H)
    extrude(amount=BOSS_EXTRUDE13_DEPTH)

    # Sketch22 → Cut-Extrude6 (cut)
    with BuildSketch(Plane(origin=(0, 0, -10.4775), x_dir=(-1, 0, 0), z_dir=(0, 0, -1))):
        with Locations((157.943647906, -185.517608)):
            Rectangle(SKETCH22_W, SKETCH22_H)
    extrude(amount=-CUT_EXTRUDE6_DEPTH, mode=Mode.SUBTRACT)

    # Sketch23 → Cut-Extrude7 (cut)
    with BuildSketch(Plane(origin=(0, 0, -1.55575), x_dir=(-1, 0, 0), z_dir=(0, 0, -1))):
        with Locations((133.6875455, -161.4907955)):
            Rectangle(SKETCH23_W, SKETCH23_H)
        with Locations((155.158483, -173.055733)):
            Rectangle(SKETCH23_W_2, SKETCH23_H_2)
        with Locations((176.6294205, -161.4907955)):
            Rectangle(SKETCH23_W, SKETCH23_H)
        with Locations((155.158483, -149.925858)):
            Rectangle(SKETCH23_W_2, SKETCH23_H_2)
    extrude(amount=-CUT_EXTRUDE7_DEPTH, mode=Mode.SUBTRACT)


solid = part.part
